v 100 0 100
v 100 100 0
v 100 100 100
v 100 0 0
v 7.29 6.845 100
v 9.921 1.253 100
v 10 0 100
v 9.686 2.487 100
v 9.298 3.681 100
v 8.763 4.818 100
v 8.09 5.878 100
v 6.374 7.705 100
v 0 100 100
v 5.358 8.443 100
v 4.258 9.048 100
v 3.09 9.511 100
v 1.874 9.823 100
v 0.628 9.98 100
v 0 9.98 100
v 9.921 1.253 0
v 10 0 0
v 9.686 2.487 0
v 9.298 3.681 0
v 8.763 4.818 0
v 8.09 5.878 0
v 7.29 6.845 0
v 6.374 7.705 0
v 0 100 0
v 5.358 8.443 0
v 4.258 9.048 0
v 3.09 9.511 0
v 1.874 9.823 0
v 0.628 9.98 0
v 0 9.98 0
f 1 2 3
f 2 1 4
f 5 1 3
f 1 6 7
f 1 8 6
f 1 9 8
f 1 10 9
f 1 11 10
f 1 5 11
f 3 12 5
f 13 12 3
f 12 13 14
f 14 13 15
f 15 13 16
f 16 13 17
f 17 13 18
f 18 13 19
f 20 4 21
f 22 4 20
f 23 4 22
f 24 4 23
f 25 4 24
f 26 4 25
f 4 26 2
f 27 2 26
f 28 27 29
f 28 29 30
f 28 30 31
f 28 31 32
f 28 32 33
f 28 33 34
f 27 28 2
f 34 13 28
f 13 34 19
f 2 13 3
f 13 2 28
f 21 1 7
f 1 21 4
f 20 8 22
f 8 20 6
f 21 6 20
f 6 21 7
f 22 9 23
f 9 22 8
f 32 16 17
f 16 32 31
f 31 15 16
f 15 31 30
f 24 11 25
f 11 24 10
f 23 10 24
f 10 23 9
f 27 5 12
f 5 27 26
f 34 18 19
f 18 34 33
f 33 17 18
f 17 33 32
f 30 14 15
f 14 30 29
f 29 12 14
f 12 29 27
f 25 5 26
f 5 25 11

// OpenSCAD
// Author: Mihai Oltean, https://mihaioltean.github.io, mihai.oltean@gmail.com
// More details: https://jenny5.org, https://jenny5-robot.github.io/
// Source code: github.com/jenny5-robot
// License: MIT
//--------------------------------------------------------------
module corner(radius, height)
{
	difference(){
		cube ([radius, radius, height]);
		cylinder	(h = height, r = radius, $fn = 30);
	}
}
//---------------------------------------------------------------
module spherical_corner(radius)
{
	difference(){
		cube ([radius, radius, radius]);
		sphere(r = radius, $fn = 40);
	}
}
//---------------------------------------------------------------
module spherical_column(height, radius)
{
		difference(){
			cube ([height, height, height]);
			cylinder(h= height, r = radius, $fn = 50);
		}
}
//---------------------------------------------------------------

spherical_column(height = 100, radius = 10);
